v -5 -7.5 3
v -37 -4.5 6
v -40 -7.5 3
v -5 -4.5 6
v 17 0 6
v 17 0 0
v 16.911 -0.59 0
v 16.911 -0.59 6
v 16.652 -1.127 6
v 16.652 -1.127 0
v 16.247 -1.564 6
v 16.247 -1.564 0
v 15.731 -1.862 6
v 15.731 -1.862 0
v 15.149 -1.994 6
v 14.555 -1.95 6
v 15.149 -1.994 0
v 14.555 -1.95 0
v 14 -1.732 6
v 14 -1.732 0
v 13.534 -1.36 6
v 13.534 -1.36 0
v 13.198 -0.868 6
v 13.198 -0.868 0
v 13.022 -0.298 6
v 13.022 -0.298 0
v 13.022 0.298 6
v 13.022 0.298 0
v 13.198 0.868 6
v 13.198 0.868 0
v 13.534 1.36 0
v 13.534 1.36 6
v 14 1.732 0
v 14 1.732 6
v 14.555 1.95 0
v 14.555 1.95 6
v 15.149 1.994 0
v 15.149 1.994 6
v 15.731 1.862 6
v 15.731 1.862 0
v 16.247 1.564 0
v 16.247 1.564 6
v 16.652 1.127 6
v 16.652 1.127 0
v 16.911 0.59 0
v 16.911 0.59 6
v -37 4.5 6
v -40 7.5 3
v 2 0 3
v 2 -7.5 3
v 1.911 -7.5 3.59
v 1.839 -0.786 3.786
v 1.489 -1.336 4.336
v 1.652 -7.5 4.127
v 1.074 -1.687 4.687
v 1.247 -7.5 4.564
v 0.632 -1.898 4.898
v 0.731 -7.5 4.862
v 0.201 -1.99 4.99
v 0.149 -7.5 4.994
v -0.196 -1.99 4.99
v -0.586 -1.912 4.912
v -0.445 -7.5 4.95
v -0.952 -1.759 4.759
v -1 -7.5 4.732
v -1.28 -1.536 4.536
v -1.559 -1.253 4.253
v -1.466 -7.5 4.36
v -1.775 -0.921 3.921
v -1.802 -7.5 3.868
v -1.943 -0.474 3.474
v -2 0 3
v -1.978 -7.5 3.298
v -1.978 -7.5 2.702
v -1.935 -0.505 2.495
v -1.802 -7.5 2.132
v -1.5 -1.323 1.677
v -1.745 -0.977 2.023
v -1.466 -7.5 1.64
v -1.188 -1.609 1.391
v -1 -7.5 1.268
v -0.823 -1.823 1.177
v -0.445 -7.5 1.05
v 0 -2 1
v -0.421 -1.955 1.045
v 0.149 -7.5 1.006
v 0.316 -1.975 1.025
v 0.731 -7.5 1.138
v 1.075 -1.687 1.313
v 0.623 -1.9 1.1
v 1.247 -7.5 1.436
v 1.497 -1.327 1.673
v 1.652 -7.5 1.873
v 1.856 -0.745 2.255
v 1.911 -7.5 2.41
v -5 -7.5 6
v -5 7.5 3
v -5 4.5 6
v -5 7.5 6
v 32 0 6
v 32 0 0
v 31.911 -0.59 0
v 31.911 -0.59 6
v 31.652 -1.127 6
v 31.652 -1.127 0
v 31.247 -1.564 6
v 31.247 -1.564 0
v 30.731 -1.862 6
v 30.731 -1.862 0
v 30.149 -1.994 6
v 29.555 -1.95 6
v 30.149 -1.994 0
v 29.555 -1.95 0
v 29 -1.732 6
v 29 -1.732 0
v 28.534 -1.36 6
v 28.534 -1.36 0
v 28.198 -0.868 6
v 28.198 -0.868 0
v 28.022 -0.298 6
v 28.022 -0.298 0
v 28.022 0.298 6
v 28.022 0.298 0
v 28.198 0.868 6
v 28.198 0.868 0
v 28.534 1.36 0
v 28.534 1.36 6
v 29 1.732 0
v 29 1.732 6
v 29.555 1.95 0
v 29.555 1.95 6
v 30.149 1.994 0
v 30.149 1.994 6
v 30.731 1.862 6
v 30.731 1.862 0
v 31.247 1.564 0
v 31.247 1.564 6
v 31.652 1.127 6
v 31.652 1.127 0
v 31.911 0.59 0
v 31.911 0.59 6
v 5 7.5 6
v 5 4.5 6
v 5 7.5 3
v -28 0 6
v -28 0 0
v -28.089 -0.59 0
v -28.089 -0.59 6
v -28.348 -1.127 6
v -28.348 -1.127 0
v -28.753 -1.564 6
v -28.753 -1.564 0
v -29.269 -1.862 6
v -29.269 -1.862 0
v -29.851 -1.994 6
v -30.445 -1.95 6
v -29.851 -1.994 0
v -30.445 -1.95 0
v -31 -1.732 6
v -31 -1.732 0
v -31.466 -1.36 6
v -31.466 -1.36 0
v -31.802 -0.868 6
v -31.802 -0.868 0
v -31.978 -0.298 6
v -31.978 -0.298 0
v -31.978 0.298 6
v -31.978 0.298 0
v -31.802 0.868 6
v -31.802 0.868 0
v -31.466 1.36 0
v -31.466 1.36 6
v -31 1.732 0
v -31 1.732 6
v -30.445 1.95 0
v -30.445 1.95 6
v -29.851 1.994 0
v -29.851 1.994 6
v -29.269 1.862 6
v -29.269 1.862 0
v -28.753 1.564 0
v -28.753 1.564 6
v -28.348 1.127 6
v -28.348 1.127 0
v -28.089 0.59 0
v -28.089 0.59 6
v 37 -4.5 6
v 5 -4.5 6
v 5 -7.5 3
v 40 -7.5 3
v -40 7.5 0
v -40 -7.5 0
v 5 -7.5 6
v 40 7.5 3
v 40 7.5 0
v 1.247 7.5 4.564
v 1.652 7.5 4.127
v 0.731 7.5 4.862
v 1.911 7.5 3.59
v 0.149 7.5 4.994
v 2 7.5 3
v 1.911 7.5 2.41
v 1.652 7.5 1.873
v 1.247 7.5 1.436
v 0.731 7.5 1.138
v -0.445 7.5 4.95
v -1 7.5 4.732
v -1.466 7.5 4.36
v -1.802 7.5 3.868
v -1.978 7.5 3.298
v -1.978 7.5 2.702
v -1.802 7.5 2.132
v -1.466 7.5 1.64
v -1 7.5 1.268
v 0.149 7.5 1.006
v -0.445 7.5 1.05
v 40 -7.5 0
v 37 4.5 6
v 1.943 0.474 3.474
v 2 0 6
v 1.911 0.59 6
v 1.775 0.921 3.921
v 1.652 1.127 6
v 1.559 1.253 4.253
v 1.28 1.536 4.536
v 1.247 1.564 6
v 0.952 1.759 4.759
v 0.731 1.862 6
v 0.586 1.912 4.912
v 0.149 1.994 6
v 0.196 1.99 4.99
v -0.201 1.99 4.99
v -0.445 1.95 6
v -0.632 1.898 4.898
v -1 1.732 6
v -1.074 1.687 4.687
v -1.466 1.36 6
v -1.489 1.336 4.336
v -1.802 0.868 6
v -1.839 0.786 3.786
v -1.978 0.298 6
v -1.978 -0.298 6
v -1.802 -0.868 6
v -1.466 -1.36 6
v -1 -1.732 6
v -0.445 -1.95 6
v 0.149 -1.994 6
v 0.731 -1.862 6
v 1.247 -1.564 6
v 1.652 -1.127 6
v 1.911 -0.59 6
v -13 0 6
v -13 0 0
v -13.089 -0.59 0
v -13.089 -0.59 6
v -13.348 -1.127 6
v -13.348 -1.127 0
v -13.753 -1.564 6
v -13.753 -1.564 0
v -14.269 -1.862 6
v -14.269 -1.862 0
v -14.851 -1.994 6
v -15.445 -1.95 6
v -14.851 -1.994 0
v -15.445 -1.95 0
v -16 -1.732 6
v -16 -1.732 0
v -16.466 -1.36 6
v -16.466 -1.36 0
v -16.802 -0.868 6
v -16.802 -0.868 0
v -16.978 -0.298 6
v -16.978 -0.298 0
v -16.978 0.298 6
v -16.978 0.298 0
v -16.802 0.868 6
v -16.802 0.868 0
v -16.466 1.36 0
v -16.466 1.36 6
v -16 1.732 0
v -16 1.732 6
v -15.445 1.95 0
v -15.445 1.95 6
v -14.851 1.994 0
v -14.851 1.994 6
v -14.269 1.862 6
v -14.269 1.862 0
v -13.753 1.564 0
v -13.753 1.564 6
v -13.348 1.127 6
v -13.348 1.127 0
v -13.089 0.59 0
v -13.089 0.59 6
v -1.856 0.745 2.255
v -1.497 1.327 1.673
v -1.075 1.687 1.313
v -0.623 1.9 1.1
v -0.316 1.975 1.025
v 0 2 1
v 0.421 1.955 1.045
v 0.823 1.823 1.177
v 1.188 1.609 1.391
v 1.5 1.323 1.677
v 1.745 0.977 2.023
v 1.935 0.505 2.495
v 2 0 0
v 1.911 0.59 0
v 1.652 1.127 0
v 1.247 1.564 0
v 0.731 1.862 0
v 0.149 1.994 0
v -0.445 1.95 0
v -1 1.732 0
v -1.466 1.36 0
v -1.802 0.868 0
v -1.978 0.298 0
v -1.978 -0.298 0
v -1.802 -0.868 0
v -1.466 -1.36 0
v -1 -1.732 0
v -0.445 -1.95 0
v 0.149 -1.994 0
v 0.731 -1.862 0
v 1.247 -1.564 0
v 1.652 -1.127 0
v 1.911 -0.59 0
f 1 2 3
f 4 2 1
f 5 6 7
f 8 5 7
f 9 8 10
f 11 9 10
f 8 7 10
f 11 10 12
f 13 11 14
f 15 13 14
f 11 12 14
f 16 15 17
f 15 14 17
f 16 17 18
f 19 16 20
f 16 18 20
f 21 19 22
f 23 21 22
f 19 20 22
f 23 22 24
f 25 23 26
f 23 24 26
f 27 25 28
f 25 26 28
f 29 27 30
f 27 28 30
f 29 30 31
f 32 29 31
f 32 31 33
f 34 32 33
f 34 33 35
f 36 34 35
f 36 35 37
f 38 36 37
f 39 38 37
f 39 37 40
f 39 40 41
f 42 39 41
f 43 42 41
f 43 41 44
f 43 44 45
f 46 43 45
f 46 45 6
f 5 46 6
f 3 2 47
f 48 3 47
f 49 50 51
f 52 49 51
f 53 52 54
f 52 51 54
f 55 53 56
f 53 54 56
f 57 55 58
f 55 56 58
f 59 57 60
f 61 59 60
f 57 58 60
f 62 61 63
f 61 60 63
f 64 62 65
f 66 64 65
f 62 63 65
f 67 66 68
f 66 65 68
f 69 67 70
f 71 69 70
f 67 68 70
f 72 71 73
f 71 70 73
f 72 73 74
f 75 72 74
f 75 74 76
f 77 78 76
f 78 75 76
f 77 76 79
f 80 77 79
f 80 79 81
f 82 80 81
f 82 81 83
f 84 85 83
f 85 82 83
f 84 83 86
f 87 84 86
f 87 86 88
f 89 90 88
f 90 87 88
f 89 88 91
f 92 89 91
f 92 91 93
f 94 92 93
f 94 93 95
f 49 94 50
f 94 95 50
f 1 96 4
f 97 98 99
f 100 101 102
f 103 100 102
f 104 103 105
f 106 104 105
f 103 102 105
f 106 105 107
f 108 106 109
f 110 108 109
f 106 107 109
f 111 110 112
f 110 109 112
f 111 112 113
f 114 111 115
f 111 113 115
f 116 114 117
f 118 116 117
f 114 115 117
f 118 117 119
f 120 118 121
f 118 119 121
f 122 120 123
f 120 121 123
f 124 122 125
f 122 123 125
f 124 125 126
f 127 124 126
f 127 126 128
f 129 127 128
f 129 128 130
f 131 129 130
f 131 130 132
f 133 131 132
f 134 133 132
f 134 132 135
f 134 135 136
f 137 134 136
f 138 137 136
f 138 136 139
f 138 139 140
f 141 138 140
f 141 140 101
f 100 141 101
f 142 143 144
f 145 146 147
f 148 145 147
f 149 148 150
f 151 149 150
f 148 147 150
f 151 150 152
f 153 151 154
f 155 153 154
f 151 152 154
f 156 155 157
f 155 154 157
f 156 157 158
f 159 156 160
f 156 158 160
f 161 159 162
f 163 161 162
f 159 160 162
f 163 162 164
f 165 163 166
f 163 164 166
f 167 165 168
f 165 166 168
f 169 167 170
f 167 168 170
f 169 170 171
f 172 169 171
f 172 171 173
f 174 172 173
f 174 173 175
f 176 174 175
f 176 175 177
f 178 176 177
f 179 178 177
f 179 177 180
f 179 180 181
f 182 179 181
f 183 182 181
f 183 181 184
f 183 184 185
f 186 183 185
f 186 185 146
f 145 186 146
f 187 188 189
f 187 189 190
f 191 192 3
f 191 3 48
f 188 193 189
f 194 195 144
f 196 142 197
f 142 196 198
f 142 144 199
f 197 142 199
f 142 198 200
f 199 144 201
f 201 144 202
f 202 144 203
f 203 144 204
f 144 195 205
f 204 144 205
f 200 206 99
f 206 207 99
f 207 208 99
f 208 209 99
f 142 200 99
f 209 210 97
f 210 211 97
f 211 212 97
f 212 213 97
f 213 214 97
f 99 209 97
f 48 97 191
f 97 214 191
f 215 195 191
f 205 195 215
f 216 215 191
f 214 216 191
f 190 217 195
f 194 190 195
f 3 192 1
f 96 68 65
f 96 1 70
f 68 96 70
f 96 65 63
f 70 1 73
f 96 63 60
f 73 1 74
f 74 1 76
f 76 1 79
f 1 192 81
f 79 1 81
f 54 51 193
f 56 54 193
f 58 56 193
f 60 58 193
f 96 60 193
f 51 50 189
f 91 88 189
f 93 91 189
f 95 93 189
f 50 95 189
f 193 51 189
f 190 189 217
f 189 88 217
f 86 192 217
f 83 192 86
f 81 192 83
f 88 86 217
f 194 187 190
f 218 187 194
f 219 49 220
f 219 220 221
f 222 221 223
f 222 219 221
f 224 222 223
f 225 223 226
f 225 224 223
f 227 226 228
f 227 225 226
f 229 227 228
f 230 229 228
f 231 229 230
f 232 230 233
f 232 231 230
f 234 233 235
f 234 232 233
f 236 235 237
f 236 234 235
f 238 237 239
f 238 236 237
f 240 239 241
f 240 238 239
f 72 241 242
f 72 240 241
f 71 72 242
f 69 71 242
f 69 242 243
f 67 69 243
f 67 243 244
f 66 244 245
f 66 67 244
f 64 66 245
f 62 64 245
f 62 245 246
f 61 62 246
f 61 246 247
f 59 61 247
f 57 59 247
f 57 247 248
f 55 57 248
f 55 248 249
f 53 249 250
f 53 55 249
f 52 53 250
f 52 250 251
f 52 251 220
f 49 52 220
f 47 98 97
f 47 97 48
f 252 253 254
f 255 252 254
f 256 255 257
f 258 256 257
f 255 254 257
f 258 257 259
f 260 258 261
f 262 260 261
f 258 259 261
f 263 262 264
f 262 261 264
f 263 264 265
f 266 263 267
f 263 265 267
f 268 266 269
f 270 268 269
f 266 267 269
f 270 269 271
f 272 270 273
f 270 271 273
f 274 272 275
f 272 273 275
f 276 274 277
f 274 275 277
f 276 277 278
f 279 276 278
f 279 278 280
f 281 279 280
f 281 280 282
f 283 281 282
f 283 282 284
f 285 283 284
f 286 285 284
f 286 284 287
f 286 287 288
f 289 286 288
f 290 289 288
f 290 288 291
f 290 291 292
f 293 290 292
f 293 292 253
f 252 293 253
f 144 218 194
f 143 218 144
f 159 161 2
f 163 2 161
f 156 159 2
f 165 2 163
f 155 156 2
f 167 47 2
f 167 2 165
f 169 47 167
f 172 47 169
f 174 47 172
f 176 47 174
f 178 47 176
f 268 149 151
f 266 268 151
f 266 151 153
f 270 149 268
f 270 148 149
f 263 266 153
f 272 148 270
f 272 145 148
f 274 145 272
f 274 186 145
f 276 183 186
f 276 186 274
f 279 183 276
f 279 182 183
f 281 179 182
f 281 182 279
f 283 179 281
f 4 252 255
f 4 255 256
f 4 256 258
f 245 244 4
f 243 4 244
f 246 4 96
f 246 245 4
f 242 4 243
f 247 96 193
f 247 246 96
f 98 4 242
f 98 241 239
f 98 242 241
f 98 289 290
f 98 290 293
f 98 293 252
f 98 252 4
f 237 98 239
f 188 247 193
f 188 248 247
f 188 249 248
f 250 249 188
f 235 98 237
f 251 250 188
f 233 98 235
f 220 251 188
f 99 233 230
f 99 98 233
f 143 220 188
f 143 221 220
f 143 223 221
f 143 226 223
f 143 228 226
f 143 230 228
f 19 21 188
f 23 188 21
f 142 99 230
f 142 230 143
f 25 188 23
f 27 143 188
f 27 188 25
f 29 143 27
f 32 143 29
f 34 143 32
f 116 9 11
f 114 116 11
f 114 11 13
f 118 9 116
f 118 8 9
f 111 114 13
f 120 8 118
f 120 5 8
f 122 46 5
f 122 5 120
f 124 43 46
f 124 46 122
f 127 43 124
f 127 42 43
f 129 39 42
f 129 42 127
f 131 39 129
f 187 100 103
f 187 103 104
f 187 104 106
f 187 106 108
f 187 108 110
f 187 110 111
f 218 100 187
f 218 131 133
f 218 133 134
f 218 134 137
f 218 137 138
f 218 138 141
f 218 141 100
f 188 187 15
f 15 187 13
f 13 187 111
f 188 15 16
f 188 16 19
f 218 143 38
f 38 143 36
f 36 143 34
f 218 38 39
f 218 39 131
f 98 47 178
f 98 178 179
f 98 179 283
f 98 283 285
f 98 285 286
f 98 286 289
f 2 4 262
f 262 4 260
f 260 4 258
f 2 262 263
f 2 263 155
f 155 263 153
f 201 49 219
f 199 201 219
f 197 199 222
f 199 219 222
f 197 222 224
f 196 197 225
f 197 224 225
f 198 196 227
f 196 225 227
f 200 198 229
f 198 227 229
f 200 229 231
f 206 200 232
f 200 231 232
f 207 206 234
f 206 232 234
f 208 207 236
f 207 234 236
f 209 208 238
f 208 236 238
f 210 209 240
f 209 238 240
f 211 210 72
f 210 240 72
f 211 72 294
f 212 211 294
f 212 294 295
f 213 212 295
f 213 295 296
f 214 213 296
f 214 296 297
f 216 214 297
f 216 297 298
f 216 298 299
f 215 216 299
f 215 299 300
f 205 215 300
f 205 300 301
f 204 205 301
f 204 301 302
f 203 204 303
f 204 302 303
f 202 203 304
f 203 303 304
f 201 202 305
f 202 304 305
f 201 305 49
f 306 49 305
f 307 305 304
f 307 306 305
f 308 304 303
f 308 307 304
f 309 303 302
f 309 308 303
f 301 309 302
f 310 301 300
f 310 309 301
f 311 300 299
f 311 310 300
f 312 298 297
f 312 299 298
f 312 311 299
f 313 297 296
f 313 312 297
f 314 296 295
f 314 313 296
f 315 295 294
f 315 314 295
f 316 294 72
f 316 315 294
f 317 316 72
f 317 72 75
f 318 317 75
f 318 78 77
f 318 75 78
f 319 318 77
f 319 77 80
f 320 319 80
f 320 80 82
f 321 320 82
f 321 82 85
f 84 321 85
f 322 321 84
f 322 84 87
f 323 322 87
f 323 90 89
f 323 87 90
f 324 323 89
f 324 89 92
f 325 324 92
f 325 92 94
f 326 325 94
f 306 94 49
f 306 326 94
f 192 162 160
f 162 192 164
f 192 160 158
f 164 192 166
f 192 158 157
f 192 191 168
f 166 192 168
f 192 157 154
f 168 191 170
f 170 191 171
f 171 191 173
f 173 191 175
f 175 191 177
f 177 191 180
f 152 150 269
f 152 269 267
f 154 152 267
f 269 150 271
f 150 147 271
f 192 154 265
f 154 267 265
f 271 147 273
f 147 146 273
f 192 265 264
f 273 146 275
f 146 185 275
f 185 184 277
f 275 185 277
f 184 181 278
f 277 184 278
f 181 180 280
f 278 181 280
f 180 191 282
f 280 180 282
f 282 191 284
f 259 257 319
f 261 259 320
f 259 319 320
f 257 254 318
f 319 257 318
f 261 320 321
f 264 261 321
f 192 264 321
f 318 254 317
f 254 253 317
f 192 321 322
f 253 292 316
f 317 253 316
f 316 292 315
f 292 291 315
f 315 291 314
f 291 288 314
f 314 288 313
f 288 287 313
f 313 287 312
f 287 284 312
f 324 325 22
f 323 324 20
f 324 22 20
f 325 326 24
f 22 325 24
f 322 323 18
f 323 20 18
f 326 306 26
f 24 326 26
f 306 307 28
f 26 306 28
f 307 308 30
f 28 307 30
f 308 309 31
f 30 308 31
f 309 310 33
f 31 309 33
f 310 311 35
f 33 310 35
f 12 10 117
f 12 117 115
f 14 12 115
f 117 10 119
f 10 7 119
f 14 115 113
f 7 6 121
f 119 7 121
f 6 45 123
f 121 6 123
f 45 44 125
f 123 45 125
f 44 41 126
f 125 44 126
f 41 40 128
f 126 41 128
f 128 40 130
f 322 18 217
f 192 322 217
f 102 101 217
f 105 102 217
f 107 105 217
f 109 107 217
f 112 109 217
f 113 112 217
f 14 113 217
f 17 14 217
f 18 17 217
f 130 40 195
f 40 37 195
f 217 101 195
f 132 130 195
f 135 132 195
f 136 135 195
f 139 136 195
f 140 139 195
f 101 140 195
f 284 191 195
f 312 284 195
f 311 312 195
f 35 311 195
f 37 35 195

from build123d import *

# Parameters (mm, degrees)
F0_W     = 35
F0_H     = 15
F0_W_2   = 10
F0_R     = 2
F1_DEPTH = 6
F2_SIZE  = 3
F3_R     = 2
F4_DEPTH = 12
F5_DEPTH = 6
F6_R     = 2
F7_DEPTH = 15.001


with BuildPart() as f1:
    # F0 (on Top) → F1 (new body)
    with BuildSketch(Plane.XY):
        with Locations((22.5, 0)):
            Rectangle(F0_W, F0_H)
        Rectangle(F0_W_2, F0_H)
        Circle(F0_R, mode=Mode.SUBTRACT)
        with Locations((-22.5, 0)):
            Rectangle(F0_W, F0_H)
    extrude(amount=F1_DEPTH)

    # F2
    f2_edges = [f1.edges().sort_by_distance(p)[0] for p in [
        (0, -7.5, 6),
        (-40, 0, 6),
        (40, 0, 6),
        (0, 7.5, 6),
    ]]
    chamfer(f2_edges, length=F2_SIZE)

    # F3 (on face) → F4 (cut)
    with BuildSketch(Plane(origin=(0, 0, 0), x_dir=(1, 0, 0), z_dir=(0, 0, -1))):
        with Locations((-30, 0)):
            Circle(F3_R)
        with Locations((-15, 0)):
            Circle(F3_R)
        with Locations((15, 0)):
            Circle(F3_R)
        with Locations((30, 0)):
            Circle(F3_R)
    extrude(amount=-F4_DEPTH, mode=Mode.SUBTRACT)

    # F0 (on Top) → F5 (join)
    with BuildSketch(Plane.XY):
        Rectangle(F0_W_2, F0_H)
        Circle(F0_R, mode=Mode.SUBTRACT)
    extrude(amount=F5_DEPTH)

    # F6 (on face) → F7 (cut, through all)
    with BuildSketch(Plane.XZ.offset(7.5)):
        with Locations((0, 3)):
            Circle(F6_R)
    extrude(amount=-F7_DEPTH, mode=Mode.SUBTRACT)


solid = f1.part
